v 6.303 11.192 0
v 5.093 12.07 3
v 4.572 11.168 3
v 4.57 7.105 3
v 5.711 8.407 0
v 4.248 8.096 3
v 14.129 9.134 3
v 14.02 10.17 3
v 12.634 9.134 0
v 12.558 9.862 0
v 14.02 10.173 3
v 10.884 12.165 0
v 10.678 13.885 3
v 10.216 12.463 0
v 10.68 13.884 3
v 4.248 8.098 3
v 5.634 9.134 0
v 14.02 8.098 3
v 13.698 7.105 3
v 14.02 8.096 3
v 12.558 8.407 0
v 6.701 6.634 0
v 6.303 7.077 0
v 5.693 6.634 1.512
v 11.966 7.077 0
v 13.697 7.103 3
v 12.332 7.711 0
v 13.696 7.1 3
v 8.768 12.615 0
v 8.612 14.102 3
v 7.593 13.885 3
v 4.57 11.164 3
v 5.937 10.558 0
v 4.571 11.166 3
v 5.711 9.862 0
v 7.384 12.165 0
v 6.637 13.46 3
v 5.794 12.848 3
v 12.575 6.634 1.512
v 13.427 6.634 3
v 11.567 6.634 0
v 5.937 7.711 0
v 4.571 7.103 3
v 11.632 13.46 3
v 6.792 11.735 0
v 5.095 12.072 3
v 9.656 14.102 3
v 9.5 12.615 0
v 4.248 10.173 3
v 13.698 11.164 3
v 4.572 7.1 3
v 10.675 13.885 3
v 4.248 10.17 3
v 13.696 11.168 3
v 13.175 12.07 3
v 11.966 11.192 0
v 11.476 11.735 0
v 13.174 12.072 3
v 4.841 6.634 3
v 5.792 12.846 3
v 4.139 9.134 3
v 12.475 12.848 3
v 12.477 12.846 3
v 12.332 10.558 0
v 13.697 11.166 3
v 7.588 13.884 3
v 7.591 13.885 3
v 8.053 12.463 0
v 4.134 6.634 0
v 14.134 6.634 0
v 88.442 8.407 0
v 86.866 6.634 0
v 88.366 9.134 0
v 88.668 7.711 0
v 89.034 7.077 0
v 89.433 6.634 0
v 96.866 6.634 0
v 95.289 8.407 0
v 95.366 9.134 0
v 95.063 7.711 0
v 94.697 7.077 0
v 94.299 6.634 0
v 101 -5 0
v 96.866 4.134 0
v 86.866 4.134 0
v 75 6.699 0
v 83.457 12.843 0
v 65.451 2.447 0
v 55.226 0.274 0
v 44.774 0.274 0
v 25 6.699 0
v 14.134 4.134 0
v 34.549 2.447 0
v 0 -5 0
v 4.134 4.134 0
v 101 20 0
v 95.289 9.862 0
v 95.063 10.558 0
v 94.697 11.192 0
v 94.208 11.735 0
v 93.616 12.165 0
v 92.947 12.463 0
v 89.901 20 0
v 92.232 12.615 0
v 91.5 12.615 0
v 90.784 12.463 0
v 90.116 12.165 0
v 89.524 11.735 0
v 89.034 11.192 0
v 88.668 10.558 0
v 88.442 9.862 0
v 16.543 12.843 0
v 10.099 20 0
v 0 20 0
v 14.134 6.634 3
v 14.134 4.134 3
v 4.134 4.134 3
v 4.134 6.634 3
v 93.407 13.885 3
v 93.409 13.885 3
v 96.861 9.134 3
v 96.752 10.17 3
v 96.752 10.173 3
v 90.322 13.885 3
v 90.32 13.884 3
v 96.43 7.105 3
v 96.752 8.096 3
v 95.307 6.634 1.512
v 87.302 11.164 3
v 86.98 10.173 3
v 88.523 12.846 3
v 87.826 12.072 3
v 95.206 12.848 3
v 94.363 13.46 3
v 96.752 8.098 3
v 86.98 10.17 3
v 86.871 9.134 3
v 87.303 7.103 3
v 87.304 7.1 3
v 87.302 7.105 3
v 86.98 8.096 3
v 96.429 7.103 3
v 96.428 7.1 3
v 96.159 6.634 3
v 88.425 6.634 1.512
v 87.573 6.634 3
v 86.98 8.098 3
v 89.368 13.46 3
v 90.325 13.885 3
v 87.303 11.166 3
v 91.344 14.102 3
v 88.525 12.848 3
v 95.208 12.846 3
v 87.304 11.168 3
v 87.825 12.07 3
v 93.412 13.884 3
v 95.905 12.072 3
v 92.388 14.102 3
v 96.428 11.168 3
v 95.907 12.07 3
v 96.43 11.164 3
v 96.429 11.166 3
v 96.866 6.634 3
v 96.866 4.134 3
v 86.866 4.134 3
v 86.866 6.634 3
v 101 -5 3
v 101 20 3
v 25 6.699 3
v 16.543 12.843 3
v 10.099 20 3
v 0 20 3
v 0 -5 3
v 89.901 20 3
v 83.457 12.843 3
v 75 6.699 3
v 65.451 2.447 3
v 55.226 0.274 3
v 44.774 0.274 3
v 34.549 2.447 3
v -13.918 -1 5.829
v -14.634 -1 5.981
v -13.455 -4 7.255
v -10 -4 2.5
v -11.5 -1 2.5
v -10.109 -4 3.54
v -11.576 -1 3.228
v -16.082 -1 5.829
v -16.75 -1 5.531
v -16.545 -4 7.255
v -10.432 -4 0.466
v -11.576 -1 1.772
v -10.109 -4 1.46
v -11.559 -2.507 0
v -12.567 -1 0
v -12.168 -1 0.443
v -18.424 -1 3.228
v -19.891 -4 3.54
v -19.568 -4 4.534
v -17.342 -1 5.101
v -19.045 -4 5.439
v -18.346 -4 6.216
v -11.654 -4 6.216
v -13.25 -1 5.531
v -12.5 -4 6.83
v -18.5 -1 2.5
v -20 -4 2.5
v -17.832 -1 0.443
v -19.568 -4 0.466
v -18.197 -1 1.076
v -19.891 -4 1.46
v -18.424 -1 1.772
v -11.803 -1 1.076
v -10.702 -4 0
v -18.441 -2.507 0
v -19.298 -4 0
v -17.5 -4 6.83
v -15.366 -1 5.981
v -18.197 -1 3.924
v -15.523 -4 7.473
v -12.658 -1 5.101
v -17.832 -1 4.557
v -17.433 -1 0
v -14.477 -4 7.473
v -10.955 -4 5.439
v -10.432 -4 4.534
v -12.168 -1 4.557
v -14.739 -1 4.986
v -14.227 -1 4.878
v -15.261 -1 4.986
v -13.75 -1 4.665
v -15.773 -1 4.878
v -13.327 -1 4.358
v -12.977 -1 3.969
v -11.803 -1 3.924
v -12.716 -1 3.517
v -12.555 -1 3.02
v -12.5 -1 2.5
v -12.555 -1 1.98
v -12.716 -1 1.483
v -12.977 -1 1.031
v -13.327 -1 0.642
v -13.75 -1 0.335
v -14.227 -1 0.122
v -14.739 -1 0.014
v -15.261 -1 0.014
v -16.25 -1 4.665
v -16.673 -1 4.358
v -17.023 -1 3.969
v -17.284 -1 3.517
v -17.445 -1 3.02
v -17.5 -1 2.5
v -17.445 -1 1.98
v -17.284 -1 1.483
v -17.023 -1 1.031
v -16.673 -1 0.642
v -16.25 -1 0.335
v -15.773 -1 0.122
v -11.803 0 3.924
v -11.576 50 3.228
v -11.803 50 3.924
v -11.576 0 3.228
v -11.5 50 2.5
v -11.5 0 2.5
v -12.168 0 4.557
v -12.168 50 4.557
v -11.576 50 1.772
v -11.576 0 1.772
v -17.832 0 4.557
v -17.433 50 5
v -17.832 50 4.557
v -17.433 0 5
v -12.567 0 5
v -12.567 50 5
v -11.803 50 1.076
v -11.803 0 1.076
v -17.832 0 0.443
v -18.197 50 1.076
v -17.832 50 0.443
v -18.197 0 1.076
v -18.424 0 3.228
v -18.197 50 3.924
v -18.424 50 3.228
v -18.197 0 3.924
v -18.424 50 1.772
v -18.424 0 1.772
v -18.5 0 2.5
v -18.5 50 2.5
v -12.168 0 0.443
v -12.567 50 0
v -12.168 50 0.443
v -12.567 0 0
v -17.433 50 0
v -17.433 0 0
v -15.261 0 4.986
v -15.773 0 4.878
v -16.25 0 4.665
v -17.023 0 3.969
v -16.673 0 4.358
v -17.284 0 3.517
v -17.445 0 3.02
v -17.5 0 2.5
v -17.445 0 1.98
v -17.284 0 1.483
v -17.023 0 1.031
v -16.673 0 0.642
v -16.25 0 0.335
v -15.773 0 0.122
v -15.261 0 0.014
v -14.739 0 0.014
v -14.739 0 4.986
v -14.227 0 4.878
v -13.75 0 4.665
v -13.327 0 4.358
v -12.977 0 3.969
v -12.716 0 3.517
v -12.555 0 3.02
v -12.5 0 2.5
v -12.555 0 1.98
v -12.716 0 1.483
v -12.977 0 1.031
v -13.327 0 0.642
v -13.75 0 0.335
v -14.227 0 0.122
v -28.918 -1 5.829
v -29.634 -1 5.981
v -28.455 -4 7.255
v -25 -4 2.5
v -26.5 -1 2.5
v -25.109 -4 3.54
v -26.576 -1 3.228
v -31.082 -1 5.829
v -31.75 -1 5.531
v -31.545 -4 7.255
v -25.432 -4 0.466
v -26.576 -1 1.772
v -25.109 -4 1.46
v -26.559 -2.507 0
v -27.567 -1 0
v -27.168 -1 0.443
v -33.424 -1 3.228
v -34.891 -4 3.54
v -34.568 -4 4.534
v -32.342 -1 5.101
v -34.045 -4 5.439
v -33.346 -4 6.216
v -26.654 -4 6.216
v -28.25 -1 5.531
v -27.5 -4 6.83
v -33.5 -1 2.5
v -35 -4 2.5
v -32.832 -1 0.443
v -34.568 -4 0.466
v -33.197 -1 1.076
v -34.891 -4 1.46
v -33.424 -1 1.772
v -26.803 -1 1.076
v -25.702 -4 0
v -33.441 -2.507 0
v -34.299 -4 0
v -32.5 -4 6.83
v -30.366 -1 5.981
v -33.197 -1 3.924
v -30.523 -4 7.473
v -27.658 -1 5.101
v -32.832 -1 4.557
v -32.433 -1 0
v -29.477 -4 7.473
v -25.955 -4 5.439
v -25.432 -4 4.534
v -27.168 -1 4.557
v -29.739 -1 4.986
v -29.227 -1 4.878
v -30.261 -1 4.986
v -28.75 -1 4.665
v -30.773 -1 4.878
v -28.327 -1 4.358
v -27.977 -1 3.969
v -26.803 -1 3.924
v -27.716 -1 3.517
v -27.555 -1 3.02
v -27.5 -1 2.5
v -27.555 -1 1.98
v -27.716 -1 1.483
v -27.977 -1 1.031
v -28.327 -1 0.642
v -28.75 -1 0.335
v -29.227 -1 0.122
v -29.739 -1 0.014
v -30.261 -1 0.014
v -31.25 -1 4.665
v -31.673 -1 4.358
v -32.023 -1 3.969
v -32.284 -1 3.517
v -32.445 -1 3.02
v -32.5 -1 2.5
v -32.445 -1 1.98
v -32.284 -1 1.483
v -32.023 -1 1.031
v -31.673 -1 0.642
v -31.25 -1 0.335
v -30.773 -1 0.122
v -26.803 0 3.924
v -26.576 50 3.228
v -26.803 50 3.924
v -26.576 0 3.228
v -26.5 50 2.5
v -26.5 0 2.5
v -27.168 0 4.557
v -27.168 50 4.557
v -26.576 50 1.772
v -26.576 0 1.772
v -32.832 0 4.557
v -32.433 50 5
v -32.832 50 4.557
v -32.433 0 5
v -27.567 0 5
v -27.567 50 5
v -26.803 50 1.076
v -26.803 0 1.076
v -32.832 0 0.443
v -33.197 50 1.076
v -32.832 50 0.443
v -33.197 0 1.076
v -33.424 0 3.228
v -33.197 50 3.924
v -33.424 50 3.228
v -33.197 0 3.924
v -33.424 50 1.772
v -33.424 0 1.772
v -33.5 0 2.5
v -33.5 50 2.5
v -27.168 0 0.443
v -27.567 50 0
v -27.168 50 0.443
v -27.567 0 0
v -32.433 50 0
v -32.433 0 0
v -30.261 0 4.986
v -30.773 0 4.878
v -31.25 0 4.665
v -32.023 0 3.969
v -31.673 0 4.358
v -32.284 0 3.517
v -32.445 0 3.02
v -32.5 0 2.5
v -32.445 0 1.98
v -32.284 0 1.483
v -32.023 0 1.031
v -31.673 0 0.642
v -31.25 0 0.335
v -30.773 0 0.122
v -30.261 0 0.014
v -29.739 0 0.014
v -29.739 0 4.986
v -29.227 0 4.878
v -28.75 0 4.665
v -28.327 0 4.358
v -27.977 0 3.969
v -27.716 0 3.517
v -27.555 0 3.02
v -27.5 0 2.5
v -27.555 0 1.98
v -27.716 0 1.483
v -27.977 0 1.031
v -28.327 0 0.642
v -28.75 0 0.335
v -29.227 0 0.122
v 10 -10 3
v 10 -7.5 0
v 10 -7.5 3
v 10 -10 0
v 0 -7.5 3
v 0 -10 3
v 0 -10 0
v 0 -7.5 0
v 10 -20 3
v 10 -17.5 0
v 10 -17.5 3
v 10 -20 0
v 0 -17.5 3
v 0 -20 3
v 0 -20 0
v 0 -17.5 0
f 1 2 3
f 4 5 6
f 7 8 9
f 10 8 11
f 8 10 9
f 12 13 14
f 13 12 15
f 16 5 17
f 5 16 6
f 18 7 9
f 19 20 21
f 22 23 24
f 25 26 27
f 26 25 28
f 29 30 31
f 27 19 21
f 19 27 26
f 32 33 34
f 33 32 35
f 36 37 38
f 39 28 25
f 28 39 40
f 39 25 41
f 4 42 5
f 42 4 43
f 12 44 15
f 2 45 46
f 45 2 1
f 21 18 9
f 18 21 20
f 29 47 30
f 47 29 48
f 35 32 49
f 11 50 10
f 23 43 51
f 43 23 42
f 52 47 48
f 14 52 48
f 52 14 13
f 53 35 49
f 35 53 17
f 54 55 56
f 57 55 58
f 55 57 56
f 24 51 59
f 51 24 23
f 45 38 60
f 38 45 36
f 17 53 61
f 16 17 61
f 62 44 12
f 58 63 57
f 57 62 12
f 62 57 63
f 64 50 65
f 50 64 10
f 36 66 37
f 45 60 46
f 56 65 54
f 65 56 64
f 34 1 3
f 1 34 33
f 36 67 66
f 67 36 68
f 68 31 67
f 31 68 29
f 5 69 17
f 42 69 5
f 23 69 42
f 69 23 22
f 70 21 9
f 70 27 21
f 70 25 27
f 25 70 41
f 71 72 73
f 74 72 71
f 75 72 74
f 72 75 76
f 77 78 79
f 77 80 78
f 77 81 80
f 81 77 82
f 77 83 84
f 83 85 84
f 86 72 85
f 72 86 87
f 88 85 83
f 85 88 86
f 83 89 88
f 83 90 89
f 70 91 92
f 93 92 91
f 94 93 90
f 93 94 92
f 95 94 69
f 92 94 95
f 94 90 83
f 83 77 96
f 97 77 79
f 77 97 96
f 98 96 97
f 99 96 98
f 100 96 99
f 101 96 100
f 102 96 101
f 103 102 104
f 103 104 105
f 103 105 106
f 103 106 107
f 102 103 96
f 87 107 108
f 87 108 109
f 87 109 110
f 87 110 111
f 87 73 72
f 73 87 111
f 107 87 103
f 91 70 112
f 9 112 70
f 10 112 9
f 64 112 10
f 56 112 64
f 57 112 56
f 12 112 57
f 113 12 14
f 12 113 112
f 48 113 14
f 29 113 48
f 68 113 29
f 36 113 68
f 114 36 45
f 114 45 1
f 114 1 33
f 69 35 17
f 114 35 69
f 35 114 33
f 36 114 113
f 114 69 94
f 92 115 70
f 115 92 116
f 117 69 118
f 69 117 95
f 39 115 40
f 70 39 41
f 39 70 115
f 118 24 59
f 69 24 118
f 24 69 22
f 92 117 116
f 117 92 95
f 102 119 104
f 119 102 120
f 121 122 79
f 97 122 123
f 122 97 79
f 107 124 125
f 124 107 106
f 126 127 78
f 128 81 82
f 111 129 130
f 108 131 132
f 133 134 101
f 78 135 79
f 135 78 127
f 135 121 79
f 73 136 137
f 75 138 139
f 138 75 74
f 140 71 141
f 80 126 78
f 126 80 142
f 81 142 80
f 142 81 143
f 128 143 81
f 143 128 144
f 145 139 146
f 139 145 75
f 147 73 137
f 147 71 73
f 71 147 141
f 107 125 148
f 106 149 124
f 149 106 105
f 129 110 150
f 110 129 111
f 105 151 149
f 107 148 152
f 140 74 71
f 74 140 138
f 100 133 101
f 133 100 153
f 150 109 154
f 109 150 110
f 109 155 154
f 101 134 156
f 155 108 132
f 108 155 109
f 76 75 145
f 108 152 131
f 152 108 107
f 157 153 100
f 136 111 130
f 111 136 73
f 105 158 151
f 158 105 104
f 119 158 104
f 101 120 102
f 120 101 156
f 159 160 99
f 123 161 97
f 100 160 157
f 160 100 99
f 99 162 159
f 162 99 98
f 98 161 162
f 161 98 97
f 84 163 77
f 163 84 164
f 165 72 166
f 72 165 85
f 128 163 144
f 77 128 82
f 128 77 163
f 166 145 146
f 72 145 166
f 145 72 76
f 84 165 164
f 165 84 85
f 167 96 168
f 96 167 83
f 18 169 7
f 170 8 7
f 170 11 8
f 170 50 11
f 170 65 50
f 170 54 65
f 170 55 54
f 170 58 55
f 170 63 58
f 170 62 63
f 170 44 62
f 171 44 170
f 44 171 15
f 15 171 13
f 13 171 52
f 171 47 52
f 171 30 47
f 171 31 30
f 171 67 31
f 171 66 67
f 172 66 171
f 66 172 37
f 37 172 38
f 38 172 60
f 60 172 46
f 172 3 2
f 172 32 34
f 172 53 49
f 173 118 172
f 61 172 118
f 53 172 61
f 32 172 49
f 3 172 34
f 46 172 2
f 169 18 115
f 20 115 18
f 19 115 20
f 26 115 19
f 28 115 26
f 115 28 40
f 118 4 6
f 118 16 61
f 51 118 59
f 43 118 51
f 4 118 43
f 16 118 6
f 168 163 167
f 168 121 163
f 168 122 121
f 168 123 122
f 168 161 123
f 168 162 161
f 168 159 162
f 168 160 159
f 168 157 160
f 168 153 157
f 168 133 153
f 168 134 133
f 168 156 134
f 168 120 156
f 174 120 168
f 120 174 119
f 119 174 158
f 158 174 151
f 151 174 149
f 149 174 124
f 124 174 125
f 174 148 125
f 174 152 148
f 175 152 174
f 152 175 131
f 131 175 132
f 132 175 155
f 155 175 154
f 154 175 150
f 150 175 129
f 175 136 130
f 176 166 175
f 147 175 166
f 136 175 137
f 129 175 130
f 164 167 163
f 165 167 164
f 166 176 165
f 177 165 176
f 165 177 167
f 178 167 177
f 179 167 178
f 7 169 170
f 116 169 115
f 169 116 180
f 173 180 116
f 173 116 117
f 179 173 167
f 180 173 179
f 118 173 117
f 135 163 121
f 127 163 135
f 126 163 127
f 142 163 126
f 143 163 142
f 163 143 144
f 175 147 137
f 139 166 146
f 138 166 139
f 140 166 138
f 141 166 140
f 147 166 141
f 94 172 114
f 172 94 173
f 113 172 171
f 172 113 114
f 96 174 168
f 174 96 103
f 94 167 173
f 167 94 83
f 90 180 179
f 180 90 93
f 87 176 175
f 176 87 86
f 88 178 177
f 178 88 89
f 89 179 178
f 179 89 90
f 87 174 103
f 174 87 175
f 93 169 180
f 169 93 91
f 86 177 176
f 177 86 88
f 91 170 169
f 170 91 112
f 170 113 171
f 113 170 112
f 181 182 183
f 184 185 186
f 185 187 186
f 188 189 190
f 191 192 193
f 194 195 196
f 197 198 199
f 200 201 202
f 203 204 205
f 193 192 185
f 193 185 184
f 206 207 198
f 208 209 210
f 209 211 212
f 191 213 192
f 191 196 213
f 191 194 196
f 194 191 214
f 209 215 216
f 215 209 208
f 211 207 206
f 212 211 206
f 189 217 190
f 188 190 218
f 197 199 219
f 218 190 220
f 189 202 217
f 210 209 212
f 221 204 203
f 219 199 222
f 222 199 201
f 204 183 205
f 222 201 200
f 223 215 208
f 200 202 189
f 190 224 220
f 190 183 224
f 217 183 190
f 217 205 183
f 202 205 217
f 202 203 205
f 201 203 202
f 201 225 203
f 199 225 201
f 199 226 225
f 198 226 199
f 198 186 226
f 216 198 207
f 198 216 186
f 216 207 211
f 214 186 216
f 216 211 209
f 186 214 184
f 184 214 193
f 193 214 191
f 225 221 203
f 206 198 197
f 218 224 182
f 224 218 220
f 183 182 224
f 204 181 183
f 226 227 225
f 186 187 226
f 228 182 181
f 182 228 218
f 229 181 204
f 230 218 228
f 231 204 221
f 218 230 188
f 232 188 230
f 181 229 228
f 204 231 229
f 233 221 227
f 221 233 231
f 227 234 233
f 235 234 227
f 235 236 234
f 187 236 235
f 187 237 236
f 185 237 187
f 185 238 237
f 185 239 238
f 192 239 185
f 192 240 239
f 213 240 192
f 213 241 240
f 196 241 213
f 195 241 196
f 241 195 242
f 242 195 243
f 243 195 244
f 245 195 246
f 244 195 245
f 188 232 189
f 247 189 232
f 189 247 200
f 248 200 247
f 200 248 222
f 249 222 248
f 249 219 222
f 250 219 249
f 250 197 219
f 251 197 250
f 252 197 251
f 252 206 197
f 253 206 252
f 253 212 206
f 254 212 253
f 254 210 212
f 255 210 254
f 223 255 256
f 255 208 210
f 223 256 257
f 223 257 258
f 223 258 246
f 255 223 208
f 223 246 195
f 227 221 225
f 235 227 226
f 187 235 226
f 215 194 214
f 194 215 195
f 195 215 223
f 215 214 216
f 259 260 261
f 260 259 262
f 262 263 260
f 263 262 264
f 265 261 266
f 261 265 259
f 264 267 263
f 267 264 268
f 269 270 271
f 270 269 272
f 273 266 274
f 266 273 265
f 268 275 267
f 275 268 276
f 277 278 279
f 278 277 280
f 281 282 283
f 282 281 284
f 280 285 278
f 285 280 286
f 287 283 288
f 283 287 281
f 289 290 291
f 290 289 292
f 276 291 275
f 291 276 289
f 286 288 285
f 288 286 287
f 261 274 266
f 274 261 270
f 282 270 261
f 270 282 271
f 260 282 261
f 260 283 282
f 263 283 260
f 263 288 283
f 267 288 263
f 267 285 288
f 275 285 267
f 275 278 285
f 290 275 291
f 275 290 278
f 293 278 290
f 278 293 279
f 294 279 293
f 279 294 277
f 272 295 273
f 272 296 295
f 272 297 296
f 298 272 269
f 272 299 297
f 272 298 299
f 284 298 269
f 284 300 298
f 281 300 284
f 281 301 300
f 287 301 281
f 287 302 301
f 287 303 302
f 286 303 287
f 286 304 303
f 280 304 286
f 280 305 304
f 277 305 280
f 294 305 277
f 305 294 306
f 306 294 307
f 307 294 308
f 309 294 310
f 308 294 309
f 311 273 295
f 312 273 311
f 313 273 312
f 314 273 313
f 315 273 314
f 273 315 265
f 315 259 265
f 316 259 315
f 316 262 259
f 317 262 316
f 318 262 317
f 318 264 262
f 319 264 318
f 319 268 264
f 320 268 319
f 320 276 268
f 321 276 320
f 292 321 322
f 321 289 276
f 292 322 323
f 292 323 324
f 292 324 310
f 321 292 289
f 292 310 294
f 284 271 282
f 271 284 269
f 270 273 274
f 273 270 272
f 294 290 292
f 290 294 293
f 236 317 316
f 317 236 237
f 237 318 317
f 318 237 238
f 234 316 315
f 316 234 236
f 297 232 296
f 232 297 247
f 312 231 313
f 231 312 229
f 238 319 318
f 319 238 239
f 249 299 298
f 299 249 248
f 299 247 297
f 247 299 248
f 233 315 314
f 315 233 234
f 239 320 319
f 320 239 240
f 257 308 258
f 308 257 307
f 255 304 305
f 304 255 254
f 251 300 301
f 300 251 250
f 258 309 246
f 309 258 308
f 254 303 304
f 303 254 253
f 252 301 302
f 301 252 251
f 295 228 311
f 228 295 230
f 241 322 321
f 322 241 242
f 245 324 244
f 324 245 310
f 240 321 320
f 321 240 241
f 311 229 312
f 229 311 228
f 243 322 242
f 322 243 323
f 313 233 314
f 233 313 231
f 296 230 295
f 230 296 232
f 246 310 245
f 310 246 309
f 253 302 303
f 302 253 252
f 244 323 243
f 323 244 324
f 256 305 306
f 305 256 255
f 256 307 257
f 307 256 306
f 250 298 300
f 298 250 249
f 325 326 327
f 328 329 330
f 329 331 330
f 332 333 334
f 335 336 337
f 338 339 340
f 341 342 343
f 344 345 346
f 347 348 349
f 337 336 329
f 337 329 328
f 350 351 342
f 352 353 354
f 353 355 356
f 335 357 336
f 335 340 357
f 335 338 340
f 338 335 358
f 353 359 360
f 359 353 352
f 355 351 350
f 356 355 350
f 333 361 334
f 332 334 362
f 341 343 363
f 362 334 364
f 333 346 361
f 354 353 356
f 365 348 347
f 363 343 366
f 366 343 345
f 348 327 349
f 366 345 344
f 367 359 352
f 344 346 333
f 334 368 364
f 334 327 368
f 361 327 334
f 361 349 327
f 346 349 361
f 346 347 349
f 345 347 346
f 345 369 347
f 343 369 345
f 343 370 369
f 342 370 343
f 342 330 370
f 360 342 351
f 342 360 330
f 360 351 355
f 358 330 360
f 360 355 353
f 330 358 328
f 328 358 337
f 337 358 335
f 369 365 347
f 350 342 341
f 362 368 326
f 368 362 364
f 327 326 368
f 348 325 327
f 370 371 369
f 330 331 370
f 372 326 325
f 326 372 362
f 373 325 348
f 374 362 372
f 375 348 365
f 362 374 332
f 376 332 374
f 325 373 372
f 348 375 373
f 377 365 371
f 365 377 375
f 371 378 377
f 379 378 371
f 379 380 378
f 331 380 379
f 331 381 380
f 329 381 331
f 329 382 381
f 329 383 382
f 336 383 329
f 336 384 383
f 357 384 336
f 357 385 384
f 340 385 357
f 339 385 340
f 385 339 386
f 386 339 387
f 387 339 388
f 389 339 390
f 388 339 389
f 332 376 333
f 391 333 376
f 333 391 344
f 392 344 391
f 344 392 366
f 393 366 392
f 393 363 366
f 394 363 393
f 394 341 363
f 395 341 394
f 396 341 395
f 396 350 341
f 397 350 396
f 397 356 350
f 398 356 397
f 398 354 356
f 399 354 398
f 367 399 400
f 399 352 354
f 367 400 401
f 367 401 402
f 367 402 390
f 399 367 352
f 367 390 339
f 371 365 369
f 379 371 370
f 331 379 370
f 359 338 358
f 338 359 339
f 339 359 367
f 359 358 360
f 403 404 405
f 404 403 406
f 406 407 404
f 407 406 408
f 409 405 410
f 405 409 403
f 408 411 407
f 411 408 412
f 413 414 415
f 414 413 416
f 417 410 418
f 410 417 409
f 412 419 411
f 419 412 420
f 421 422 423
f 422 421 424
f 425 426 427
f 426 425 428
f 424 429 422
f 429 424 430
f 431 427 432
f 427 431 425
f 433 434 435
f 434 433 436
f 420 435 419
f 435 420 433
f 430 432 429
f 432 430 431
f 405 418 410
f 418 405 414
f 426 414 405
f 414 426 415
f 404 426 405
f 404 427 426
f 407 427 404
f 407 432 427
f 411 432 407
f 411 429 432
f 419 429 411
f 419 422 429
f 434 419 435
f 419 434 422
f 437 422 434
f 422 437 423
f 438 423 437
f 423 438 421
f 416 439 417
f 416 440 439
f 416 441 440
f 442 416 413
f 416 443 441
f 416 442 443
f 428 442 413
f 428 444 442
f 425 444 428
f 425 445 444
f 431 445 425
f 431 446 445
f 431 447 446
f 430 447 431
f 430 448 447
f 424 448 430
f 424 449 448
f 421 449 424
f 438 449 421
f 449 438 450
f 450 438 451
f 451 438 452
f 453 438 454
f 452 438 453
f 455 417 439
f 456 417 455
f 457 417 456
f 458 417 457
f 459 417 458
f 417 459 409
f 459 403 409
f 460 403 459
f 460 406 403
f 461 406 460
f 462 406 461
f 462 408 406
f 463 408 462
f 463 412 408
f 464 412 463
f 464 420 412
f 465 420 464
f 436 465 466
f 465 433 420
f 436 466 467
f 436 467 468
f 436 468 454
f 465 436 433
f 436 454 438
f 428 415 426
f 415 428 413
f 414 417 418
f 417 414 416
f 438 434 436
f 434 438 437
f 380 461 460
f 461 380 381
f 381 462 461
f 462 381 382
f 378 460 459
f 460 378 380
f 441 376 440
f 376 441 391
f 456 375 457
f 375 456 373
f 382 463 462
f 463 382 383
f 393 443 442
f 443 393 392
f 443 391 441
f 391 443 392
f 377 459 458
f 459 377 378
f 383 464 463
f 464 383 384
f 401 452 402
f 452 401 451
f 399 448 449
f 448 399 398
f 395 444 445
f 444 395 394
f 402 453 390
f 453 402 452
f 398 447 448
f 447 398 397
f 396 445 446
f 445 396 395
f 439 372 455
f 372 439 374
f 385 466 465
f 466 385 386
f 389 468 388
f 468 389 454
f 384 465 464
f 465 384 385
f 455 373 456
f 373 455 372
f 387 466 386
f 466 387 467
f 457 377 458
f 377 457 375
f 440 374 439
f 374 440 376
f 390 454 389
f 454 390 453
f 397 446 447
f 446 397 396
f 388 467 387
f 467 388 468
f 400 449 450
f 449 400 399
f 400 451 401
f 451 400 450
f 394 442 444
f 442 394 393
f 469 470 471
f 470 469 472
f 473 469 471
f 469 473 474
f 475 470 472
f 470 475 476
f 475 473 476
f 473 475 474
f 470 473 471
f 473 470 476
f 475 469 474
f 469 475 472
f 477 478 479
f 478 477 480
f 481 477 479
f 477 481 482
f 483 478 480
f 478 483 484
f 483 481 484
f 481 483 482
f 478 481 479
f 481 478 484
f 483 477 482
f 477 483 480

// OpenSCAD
$fs=.5;
difference(){
	translate([0,-5,0])cube([101,25,3]);
	translate([50,50,0])cylinder(d=100,h=10,center=true);
	translate([101/2,101/2-117/2/sqrt(2),0]){
		translate([-117/4*sqrt(2),0,0]){
			cylinder(3.01,3.5,5);
			translate([-5,-5,0])cube([10,2.5,5]);
		}
		translate([117/4*sqrt(2),0,0]){
			cylinder(3.01,3.5,5);
			translate([-5,-5,0])cube([10,2.5,5]);
		}
	}
}

module stick()translate([0,0,2.5])rotate([90,0,0]){
	difference(){
		translate([0,0,1])cylinder(3,3.5,5);
		translate([-5,-12.5,0])cube(10);
	}
	cylinder(d=5,h=1);
	intersection(){
		translate([0,0,-25])cylinder(50,r=3.5,center=true);
		cube([10,5,1000],center=true);
	}
}
for(i=[1:2])translate([-15*i,0,0])
stick();

for(i=[1:2])translate([0,-10*i,0])cube([10,2.5,3]);
